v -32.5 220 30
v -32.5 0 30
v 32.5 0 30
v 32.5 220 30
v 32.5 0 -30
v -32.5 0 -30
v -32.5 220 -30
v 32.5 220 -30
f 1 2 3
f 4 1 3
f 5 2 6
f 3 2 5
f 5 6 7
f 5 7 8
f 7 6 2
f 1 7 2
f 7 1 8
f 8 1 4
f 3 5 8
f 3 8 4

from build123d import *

# Parameters (mm, degrees)
SKETCH_AS_DRAWN_W                 = 65
SKETCH_AS_DRAWN_H                 = 60
EXTRUDE001_DEPTH                  = 220
EXTRUDE001_ONTO_SKETCH_ROLL_ANGLE = 90


with BuildPart() as part:
    # Sketch as drawn → Extrude001 (new)
    with BuildSketch(Plane.XY):
        Rectangle(SKETCH_AS_DRAWN_W, SKETCH_AS_DRAWN_H)
    extrude(amount=-EXTRUDE001_DEPTH)


with BuildPart() as part_1:
    # Extrude001 onto Sketch roll: moved
    add(part.part.rotate(Axis((0, 0, 0), (1, 0, 0)), EXTRUDE001_ONTO_SKETCH_ROLL_ANGLE))


with BuildPart() as part_2:
    # Extrude001 onto Sketch placement: moved
    add(part_1.part)


solid = part_2.part
